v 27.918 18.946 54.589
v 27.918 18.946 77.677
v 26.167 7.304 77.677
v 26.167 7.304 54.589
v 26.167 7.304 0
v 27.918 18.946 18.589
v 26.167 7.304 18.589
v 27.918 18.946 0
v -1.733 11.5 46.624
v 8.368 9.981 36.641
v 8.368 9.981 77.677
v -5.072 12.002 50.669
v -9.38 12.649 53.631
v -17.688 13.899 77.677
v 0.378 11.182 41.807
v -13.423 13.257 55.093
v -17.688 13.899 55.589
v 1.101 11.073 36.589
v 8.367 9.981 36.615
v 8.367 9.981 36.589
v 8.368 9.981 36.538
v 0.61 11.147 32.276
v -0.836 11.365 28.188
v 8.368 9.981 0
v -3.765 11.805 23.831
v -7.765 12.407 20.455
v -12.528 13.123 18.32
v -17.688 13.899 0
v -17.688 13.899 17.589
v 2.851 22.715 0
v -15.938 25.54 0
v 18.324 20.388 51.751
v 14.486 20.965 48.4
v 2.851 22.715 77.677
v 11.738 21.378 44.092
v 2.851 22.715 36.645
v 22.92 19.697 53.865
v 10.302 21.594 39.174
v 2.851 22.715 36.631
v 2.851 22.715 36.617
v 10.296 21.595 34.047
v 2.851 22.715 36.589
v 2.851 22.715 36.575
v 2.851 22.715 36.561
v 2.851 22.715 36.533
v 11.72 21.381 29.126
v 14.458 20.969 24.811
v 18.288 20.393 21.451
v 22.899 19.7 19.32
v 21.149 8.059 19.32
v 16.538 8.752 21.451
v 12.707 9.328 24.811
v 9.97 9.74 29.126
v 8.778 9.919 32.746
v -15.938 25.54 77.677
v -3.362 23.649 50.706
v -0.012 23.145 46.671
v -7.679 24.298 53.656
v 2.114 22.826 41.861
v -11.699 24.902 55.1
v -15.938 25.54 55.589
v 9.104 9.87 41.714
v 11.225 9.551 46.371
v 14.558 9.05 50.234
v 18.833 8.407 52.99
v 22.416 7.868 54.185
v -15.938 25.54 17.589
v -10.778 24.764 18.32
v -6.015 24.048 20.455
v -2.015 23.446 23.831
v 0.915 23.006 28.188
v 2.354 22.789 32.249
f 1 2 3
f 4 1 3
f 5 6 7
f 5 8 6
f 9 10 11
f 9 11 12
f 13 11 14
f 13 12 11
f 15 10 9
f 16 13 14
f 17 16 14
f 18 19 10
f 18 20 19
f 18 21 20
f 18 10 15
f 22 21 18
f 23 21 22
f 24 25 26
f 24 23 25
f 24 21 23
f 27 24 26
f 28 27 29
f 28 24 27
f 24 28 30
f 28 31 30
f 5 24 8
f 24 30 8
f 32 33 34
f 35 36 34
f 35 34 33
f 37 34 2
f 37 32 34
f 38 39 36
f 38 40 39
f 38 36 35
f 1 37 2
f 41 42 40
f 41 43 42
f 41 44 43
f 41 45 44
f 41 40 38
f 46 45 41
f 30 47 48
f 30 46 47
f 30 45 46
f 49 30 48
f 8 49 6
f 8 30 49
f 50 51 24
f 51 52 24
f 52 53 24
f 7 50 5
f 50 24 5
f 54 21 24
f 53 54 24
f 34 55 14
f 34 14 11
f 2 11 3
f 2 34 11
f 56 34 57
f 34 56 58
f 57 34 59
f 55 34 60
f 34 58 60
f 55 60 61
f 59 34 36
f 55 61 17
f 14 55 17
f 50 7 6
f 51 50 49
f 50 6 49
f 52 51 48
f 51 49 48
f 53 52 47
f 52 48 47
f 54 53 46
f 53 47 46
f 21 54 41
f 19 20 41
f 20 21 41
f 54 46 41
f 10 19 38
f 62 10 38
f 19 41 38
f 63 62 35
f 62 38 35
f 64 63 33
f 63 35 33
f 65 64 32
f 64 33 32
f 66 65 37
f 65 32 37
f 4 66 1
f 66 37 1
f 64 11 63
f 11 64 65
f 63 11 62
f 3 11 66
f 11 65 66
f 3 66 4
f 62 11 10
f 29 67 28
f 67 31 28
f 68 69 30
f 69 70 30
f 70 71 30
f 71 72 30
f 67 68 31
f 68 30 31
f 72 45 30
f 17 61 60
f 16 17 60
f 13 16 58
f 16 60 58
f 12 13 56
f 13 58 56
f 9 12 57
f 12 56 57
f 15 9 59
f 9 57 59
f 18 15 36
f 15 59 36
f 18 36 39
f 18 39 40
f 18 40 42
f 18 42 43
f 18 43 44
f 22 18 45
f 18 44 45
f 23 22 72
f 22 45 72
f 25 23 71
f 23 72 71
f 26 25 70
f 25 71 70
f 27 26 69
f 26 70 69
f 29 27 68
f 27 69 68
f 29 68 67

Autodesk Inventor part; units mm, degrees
ref_plane "YZ Plane" through (0, 0, 0) normal (1, 0, 0) x (0, 1, 0)
ref_plane "XZ Plane" through (0, 0, 0) normal (0, 1, 0) x (-1, 0, 0)
ref_plane "Work Plane1" through (0, 0, 0) normal (0, 0, 1) x (1, 0, 0)
sketch "Sketch1" plane through (0, 0, 0) normal (0, 0, 1) x (1, 0, 0)
  line L0 (46.9411, 24.4056) -> (43.9673, 4.6279) construction
  line L1 (-34.7264, 28.3648) -> (-39.7819, -5.2572) construction
  line L2 (9.0191, -106.7418) -> (35.6521, 70.3833) construction
  line L3 (-3.8449, 105.9638) -> (-30.4779, -71.1613) construction
  line L4 (8.3675, 9.9808) -> (26.1674, 7.3043)
  line L5 (8.3675, 9.9808) -> (-17.688, 13.8986)
  line L6 (2.8511, 22.7146) -> (27.9178, 18.9455)
  line L7 (2.8511, 22.7146) -> (-15.9376, 25.5397)
  line L8 (-15.9376, 25.5397) -> (-17.688, 13.8986)
  line L9 (27.9178, 18.9455) -> (26.1674, 7.3043)
  point P0 (0, 0)
ref_plane "Work Plane2" through (-150.8486, -254.8124, 77.677) normal (0, 0, -1) x (0, 1, 0)
extrude "Extrusion1" add sketch "Sketch1" along normal up to surface (77.677 mm away)
sketch "Sketch2" plane through (27.9178, 18.9455, 77.677) normal (0.1487, 0.9889, 0) x (0.9889, -0.1487, 0)
  circle A0 centre (0, 41.0877) radius 18 construction
  circle A1 centre (-44.3484, 41.0877) radius 19 construction
  circle A2 centre (-44.3484, 41.0877) radius 19
  circle A3 centre (0, 41.0877) radius 18
  point P0 (-24.7904, 77.677)
extrude "Extrusion2" cut sketch "Sketch2" against normal through all
properties part number "motor mount center"
